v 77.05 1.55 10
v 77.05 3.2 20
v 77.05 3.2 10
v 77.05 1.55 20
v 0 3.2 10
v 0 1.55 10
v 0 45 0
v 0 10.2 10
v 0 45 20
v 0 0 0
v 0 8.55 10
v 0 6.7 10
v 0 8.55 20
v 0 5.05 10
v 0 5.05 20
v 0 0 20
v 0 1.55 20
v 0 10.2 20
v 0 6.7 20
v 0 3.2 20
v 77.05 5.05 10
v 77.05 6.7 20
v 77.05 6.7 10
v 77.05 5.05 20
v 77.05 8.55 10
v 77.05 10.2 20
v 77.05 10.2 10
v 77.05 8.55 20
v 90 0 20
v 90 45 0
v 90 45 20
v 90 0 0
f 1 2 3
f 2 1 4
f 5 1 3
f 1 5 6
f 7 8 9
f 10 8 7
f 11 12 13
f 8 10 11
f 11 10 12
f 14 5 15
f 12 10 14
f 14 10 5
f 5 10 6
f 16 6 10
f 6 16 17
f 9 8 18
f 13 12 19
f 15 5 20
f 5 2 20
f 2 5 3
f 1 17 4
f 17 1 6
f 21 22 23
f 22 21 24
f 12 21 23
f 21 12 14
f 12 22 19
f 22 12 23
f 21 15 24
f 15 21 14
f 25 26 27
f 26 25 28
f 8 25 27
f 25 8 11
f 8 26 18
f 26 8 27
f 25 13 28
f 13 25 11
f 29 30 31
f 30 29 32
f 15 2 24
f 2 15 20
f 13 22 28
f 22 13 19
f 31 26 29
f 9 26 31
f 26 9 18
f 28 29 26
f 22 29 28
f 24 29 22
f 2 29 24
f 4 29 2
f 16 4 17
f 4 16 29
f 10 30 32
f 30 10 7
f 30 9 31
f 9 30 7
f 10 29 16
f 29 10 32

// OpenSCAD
$fn = 64;

// --- Dimensions ---
// Block dimensions (mm)
BLOCK_X = 90;
BLOCK_Y = 45;
BLOCK_Z = 20;

// Slot dimensions (mm)
SLOT_COUNT = 10;
SLOT_X = 77;
SLOT_Y = 1.6;
SLOT_DEPTH = 10;
SLOT_SPACING_Y = 3.5;

// --- Derived Dimensions ---
// Offset for cutting rule (Rule 5): extend 0.05mm past faces
CUT_OFFSET = 0.05;

// Calculate total width of slot array including gaps
// 10 slots + 9 gaps
SLOT_ARRAY_Y_WIDTH = (SLOT_COUNT * SLOT_Y) + ((SLOT_COUNT - 1) * SLOT_SPACING_Y);

// --- Main Part ---
difference() {
    // 1. Base Block
    // Centred on origin (X, Y), resting on Z=0
    translate([0, 0, 0])
        cube([BLOCK_X, BLOCK_Y, BLOCK_Z]);

    // 2. Slots
    // Centred on block in X and Y
    // Loop for 10 slots
    for (i = [0 : SLOT_COUNT - 1]) {
        // Calculate Y position for each slot
        // Center of array is 0.
        // Slot centers are spaced by SLOT_SPACING_Y
        // First slot center offset from array center:
        // Total array width / 2 - (Slot width / 2)
        // Center of array = 0
        // Center of Slot 0 = - (SLOT_ARRAY_Y_WIDTH / 2) + (SLOT_Y / 2)
        // Center of Slot i = Center of Slot 0 + i * SLOT_SPACING_Y
        
        slot_center_y = -(SLOT_ARRAY_Y_WIDTH / 2) + (SLOT_Y / 2) + (i * SLOT_SPACING_Y);
        
        // Apply cutting offset to ensure no coplanar faces (Rule 5)
        // Cut shape extends slightly past the intended void
        cut_x = SLOT_X + CUT_OFFSET;
        cut_y = SLOT_Y + CUT_OFFSET;
        cut_z = SLOT_DEPTH + CUT_OFFSET;
        
        // Position slot to cut from top downward
        // Slot should cut from z = BLOCK_Z down to z = BLOCK_Z - SLOT_DEPTH
        // So the cutting cube should be positioned at z = BLOCK_Z - SLOT_DEPTH
        translate([0, slot_center_y, BLOCK_Z - SLOT_DEPTH])
            cube([cut_x, cut_y, cut_z]);
    }
}
